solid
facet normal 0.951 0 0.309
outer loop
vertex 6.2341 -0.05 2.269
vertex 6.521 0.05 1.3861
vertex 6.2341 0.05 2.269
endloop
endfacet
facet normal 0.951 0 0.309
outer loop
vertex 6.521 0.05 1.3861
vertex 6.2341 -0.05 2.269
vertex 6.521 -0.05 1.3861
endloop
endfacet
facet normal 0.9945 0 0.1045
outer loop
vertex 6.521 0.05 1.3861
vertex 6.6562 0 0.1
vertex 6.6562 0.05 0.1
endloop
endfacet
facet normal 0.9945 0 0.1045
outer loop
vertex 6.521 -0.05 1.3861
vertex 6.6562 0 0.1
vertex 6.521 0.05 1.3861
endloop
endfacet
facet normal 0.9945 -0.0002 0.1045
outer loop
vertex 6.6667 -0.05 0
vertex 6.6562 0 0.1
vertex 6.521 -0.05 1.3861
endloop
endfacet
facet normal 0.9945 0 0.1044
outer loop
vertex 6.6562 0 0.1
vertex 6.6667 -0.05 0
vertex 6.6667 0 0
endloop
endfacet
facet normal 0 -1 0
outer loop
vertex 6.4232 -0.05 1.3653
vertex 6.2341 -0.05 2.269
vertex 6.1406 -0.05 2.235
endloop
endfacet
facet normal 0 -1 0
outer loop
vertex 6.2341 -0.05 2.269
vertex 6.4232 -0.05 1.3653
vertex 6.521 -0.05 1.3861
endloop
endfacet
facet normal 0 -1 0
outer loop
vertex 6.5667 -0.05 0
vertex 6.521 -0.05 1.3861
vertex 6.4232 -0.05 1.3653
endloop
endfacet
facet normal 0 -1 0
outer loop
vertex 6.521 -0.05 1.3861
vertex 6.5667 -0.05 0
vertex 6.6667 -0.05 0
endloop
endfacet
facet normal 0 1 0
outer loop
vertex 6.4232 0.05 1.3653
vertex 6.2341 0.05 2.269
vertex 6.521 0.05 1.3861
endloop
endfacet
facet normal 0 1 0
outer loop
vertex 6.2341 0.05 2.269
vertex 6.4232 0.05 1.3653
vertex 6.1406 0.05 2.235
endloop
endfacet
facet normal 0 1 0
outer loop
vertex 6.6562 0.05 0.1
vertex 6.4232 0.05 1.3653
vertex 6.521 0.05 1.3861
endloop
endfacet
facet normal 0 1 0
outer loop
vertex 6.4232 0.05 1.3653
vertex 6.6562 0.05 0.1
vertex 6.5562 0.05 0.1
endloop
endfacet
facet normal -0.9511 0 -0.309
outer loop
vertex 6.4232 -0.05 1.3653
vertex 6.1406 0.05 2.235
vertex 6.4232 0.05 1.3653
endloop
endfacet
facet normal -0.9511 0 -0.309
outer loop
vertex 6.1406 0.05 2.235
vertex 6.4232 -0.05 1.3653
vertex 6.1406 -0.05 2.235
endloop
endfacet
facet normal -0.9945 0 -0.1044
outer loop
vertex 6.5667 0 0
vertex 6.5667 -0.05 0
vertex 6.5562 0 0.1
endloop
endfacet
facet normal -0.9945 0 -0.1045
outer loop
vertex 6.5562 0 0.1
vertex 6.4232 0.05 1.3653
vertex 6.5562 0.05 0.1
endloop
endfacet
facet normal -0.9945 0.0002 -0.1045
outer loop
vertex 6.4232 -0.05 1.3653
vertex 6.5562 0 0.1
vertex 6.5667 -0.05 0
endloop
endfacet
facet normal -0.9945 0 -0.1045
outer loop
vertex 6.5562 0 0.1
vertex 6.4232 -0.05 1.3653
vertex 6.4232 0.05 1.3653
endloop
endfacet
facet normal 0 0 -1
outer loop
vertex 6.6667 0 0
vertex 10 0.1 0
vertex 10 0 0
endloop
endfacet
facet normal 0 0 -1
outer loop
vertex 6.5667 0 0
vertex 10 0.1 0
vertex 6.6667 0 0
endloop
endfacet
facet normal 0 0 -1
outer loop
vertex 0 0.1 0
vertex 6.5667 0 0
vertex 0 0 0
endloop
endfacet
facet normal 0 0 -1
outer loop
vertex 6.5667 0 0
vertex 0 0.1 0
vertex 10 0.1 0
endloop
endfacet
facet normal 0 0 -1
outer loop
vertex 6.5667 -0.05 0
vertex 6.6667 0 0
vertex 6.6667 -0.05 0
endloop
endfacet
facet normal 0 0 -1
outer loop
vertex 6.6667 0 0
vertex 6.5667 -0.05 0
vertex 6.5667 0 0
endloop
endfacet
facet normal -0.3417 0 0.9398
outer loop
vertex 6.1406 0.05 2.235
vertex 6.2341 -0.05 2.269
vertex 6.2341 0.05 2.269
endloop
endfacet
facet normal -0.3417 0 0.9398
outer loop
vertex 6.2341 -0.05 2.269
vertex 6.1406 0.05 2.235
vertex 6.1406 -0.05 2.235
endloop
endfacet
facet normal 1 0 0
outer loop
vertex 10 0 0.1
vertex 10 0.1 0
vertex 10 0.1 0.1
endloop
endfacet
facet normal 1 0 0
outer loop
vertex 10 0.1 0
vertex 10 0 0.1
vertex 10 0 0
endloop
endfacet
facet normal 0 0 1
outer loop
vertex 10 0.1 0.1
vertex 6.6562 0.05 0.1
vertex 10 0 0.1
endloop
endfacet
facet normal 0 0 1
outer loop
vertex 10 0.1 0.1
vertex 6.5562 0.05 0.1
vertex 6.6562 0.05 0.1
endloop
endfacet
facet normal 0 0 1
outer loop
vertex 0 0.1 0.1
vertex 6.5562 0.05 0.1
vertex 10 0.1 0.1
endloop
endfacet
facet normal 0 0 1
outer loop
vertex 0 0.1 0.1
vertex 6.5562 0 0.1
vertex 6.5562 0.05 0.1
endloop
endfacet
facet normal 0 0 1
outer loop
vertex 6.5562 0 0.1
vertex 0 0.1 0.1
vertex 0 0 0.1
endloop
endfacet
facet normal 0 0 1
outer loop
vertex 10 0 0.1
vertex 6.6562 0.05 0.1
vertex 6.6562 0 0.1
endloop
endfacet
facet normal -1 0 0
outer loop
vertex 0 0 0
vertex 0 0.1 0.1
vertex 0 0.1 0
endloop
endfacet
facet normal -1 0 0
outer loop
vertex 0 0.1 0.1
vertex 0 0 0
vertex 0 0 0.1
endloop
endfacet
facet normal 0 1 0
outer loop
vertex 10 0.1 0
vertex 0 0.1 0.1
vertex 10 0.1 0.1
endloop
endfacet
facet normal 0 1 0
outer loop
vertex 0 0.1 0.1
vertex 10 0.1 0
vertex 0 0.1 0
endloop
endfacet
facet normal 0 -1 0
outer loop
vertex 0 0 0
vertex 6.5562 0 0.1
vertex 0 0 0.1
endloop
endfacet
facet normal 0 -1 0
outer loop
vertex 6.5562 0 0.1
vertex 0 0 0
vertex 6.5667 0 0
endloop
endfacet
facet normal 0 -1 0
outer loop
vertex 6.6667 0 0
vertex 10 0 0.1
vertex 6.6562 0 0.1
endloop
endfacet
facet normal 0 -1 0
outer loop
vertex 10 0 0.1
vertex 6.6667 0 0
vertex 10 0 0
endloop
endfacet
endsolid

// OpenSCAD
// file: ../common/echo-camera-arg.scad
// This file supports the build process by converting a files $vp*
// settings to a --camera argument to be used at the commandline (see
// CAMERA_OPT in Makefile.common).

// Two ways to used this file:
//
//    include <../common/echo-camera-arg.scad>
//
// OR
//
//    use <../common/echo-camera-arg.scad>
//    echo(cameraArg());

// $vpt/r/d in a formatted --camera argument, for the build to use to
// avoid warnings about them overriding --autocenter and
// --viewall. Use this as:
//
//     echo(cameraArg());
//
// The echo can't be in here, because OpenSCAD expects to find a
// module, not a function, if the return value is ignored. That means
// it prints a warning about being unable to find a *module* named
// camerArg.
function cameraArg() =
    str("--camera=",
        $vpt[0],",",$vpt[1],",",$vpt[2],",",
        $vpr[0],",",$vpr[1],",",$vpr[2],",",
        $vpd);

// Doing the echo here means adding this to a file is a one-liner via
// include.
echo(cameraArg());
// main file
// Example angle_label
//cmdline: --projection=o --imgsize=400,200
include <../common/echo-camera-arg.scad>

use <../common/labeling.scad>

$vpt=[ 4.90, 24.90, 1.76 ];
$vpr=[ 90.00, 0.00, 0.00 ];
$vpd=27.52;
$vpf=22.50;

$fs = 0.1;

angle_label(20, 0, 10);
